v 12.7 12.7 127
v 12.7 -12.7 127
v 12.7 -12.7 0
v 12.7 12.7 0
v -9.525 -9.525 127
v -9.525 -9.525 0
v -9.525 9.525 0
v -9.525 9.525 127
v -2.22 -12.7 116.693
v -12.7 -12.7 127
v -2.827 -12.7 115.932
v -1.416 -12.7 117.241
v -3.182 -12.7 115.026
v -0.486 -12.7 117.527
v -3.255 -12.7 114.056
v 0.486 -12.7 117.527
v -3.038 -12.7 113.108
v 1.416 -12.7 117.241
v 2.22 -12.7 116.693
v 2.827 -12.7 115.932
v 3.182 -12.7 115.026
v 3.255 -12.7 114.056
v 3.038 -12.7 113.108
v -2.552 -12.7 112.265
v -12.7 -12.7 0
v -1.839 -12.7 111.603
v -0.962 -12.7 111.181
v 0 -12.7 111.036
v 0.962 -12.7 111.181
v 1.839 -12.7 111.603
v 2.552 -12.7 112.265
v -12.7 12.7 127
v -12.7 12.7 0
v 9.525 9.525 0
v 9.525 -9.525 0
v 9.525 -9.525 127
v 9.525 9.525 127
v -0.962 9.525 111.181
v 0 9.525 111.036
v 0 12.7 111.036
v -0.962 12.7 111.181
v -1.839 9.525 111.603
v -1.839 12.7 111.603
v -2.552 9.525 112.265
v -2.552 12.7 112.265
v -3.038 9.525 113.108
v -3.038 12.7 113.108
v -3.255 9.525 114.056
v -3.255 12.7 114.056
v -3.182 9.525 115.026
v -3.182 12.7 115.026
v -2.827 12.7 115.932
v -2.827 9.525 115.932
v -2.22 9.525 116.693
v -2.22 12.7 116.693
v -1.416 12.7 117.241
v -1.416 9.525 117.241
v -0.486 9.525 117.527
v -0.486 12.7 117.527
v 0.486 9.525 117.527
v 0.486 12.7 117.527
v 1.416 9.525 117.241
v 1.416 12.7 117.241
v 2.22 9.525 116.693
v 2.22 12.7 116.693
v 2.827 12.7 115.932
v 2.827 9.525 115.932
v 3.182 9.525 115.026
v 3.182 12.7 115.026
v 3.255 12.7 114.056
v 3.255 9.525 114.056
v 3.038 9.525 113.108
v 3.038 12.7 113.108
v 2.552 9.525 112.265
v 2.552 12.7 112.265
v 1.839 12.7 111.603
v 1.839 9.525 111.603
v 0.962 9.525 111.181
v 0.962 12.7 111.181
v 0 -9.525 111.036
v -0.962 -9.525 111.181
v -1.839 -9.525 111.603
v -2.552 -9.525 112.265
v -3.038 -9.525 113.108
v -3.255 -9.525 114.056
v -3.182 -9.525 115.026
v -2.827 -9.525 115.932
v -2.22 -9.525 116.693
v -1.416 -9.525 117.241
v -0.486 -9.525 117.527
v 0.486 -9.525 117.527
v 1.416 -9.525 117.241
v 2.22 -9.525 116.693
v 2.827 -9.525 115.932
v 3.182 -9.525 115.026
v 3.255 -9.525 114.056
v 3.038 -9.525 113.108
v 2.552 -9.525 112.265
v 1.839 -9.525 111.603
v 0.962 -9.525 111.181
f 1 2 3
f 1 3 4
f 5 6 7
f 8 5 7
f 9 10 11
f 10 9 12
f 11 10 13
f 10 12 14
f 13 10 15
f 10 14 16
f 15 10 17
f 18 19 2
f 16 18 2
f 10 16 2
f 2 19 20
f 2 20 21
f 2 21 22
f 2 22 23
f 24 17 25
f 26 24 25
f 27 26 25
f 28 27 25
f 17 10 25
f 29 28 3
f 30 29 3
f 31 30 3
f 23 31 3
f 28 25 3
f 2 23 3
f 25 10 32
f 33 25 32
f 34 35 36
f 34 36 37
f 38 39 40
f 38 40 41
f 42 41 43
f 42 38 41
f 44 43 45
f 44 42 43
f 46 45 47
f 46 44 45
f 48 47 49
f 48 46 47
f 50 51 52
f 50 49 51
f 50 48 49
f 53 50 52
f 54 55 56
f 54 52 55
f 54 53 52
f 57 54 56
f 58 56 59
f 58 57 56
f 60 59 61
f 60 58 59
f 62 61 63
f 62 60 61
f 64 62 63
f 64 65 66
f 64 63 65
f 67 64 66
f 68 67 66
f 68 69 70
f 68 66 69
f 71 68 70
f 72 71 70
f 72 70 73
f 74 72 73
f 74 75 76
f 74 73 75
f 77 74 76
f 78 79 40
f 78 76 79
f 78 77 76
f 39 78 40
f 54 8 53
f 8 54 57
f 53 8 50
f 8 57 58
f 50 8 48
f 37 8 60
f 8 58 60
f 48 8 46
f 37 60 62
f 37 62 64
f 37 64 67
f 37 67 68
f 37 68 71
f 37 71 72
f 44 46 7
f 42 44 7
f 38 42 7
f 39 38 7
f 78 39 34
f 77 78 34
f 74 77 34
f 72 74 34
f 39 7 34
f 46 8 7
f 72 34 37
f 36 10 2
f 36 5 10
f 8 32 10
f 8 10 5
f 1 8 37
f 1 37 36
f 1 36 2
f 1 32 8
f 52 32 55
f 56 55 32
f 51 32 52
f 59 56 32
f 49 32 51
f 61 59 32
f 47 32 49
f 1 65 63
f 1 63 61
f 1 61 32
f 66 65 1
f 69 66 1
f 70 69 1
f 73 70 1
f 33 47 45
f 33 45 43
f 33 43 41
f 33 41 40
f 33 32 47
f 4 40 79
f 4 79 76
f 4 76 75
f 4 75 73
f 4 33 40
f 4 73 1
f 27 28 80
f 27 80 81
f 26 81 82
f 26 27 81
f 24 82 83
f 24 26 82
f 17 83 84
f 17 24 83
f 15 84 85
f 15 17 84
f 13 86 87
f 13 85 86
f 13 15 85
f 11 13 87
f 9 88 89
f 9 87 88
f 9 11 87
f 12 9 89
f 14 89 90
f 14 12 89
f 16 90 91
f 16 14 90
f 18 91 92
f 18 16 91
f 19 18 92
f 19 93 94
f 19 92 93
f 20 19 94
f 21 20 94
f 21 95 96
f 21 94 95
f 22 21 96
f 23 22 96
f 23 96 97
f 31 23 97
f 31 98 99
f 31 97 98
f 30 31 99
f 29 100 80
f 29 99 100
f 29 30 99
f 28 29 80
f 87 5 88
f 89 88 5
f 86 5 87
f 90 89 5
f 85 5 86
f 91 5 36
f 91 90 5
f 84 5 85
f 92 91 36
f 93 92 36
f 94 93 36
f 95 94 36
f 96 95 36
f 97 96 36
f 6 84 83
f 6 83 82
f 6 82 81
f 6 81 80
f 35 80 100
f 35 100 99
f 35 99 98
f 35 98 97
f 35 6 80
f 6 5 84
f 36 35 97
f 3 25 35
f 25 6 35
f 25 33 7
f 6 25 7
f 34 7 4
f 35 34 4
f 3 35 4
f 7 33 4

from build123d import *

# Parameters (mm, degrees)
SKETCH1_W               = 25.4
SKETCH1_H               = 25.4
BOSS_EXTRUDE1_DEPTH     = 127
SKETCH2_W               = 19.05
SKETCH2_H               = 19.05
CUT_EXTRUDE1_DEPTH      = 129.263712717
CUT_EXTRUDE2_DEPTH      = 131.136274728
CUT_EXTRUDE2_DEPTH_BACK = 131.136274728
SKETCH3_R               = 3.2639


with BuildPart() as part:
    # Sketch1 → Boss-Extrude1 (new body)
    with BuildSketch(Plane.XY):
        Rectangle(SKETCH1_W, SKETCH1_H)
    extrude(amount=BOSS_EXTRUDE1_DEPTH)

    # Sketch2 → Cut-Extrude1 (cut, through all)
    with BuildSketch(Plane.XY):
        Rectangle(SKETCH2_W, SKETCH2_H)
    extrude(amount=CUT_EXTRUDE1_DEPTH, mode=Mode.SUBTRACT)

    # Sketch3 → Cut-Extrude2 (cut, two sides: drawn at the far end of the back side and taken through both)
    with BuildSketch(Plane(origin=(0, 12.7, 0), x_dir=(1, 0, 0), z_dir=(0, 1, 0)).offset(-CUT_EXTRUDE2_DEPTH_BACK)):
        with Locations(Location((0, -114.3, 0), (0, 0, 90))):
            Circle(SKETCH3_R)
    extrude(amount=CUT_EXTRUDE2_DEPTH + CUT_EXTRUDE2_DEPTH_BACK, mode=Mode.SUBTRACT)


solid = part.part
